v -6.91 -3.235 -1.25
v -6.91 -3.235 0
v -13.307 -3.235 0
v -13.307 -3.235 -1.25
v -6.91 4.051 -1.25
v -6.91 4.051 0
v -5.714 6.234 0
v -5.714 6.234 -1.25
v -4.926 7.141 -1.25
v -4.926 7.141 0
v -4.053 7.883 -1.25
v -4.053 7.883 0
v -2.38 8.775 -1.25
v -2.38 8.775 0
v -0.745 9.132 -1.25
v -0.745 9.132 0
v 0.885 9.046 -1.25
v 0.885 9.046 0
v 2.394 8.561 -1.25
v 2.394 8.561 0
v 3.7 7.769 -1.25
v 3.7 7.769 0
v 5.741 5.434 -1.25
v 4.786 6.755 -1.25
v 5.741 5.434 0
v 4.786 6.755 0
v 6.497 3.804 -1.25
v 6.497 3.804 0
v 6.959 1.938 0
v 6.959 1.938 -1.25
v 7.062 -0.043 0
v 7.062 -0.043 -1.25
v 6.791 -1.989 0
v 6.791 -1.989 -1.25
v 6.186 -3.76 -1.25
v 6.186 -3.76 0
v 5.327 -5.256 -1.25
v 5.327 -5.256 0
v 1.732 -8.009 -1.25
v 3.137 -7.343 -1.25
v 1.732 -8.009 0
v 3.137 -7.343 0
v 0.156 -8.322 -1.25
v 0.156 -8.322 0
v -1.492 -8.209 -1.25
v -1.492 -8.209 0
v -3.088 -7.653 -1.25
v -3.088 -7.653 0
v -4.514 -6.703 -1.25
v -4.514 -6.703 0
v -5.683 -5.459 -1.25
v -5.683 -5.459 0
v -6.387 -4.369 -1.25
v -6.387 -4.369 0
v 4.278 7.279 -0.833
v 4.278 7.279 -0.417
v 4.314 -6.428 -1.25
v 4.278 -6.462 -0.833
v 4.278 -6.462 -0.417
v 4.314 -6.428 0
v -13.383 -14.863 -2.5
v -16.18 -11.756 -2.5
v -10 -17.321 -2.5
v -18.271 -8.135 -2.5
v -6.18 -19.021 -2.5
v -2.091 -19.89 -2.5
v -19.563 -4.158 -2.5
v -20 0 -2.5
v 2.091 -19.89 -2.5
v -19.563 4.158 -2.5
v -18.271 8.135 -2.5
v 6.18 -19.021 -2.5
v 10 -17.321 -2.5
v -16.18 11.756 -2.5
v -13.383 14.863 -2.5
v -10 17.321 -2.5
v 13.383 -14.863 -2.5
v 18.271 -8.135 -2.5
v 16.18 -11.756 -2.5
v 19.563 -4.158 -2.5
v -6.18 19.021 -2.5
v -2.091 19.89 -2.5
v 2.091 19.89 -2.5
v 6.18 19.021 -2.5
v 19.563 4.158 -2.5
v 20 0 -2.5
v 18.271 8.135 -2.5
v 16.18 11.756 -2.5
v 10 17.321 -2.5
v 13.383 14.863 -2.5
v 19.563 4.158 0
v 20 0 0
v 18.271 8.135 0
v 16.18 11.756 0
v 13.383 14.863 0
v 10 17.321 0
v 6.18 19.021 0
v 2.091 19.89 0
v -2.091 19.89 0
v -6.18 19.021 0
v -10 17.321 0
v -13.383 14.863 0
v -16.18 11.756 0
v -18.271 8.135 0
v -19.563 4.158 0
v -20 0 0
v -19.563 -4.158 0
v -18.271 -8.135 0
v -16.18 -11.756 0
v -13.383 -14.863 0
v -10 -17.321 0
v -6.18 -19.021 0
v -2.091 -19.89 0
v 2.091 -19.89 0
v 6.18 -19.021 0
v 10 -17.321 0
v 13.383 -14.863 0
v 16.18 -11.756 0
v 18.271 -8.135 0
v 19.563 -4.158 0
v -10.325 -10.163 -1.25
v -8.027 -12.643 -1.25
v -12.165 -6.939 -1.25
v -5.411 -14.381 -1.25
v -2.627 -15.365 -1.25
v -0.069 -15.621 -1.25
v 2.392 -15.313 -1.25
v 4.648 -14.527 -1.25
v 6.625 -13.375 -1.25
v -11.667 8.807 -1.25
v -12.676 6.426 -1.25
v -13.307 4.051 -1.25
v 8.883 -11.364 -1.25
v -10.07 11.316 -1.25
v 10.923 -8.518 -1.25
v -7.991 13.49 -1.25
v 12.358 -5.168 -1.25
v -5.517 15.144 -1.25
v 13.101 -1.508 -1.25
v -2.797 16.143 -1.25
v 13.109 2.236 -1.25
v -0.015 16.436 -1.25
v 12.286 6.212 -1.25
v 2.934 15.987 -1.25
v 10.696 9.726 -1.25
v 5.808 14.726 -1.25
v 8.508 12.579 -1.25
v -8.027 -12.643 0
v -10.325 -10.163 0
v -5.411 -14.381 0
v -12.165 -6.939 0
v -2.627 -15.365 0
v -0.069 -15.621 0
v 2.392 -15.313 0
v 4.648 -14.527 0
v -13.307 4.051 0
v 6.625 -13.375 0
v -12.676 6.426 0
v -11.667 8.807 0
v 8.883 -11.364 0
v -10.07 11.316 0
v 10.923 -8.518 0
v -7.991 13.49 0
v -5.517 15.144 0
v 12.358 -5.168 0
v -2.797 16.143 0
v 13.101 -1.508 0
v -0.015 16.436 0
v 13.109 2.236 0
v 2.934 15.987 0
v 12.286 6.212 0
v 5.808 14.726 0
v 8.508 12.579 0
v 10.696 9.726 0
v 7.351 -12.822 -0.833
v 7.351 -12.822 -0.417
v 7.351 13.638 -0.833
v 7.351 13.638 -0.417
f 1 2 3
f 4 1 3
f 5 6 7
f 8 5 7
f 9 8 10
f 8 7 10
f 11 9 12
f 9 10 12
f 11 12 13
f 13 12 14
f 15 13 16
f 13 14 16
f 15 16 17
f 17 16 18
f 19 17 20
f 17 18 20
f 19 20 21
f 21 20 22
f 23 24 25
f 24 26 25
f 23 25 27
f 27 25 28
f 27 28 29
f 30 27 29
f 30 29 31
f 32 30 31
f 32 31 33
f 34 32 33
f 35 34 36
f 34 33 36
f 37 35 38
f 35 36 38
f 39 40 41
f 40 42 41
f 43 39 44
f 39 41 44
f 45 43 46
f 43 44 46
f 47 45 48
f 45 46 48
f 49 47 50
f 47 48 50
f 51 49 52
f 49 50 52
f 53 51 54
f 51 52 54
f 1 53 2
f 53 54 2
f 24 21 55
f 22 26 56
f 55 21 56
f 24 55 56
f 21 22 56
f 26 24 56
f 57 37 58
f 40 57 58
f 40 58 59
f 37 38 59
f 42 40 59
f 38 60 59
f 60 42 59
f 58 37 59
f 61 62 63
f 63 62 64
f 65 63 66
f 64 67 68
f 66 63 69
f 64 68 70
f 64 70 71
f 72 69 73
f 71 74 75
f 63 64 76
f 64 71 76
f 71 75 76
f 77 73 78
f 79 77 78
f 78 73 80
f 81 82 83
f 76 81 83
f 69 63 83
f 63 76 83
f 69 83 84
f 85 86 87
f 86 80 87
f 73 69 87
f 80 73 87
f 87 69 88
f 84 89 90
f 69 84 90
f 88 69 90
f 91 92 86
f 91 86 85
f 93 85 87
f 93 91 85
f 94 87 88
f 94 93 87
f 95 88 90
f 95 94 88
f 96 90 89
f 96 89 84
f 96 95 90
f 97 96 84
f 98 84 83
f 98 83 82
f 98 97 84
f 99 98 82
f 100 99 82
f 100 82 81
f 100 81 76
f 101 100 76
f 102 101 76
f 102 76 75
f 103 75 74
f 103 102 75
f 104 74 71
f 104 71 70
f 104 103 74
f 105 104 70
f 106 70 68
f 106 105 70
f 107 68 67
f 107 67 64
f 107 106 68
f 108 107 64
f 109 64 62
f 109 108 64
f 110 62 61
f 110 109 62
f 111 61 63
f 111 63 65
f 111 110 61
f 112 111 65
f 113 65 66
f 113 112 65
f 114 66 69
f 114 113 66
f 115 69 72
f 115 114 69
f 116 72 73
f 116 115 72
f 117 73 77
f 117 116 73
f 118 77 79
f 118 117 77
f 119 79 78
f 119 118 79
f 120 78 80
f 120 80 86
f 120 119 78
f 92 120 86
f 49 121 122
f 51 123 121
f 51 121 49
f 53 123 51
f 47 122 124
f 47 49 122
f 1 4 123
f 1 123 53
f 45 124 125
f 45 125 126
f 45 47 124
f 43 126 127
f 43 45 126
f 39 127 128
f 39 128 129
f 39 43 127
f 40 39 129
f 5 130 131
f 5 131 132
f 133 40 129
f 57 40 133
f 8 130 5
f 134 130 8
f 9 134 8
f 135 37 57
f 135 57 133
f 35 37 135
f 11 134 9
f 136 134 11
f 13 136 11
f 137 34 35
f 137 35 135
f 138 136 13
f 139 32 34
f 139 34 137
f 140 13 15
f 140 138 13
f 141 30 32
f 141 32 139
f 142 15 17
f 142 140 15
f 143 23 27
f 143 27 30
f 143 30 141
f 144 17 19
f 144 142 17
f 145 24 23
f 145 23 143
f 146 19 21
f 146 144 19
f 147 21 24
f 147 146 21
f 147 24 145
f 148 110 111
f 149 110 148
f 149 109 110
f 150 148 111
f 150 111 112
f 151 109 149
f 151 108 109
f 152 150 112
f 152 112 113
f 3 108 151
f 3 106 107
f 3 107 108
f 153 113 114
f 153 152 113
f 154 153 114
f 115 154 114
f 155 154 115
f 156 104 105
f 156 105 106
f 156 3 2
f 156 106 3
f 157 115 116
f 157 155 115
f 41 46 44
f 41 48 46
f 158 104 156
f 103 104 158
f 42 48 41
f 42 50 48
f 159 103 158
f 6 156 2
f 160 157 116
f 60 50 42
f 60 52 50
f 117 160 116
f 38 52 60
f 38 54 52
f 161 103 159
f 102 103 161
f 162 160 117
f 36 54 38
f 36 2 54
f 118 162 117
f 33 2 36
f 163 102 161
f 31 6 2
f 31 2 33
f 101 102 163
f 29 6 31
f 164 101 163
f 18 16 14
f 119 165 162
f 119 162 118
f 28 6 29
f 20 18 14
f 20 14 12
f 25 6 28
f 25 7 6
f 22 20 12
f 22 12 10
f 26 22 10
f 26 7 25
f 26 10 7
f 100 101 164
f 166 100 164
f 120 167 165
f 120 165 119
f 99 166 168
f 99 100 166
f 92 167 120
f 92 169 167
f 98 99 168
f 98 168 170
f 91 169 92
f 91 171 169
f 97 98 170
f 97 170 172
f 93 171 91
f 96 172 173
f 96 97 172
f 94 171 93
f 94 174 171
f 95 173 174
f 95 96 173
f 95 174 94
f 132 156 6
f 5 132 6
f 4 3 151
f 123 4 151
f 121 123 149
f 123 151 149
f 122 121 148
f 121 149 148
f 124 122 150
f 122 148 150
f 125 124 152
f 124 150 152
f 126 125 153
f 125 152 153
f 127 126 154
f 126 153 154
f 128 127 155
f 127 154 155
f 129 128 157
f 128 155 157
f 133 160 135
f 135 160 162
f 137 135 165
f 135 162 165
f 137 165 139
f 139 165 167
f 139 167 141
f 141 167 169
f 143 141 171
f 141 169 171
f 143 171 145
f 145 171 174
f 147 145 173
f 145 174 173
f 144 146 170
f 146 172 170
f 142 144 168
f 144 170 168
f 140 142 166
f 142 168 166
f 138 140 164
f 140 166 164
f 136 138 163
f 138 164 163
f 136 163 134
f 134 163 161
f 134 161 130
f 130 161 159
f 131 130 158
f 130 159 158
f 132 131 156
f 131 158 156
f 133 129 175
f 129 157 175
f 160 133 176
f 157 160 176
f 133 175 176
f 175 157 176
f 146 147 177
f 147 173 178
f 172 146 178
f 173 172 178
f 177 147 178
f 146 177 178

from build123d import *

# Parameters (mm, degrees)
SKETCH001_R  = 20
PAD_DEPTH    = 2.5
POCKET_DEPTH = 1.25


with BuildPart() as part:
    # Sketch001 (on DatumPlane) → Pad (new body)
    with BuildSketch(Plane.XY):
        Circle(SKETCH001_R)
    extrude(amount=-PAD_DEPTH)

    # Sketch002 (on DatumPlane) → Pocket (cut)
    with BuildSketch(Plane.XY):
        with BuildLine():
            add(Edge.make_bspline(
                [(-13.306781, 4.051388), (-6.910381, 4.051388)],
                knots=[0, 0, 131, 131], degree=1))
            add(Edge.make_bspline(
                [(-6.910381, 4.051388), (-3.033469, 14.149212), (4.277794, 7.278702), (11.589056, 0.408192), (4.277794, -6.462319), (-3.033469, -13.332829), (-6.910381, -3.235005)],
                knots=[3.571368, 3.571368, 3.571368, 5.379246, 5.379246, 7.187124, 7.187124, 8.995003, 8.995003, 8.995003], degree=2, weights=[1, 0.61852, 1, 0.61852, 1, 0.61852, 1]))
            add(Edge.make_bspline(
                [(-6.910381, -3.235005), (-13.306781, -3.235005)],
                knots=[0, 0, 131, 131], degree=1))
            add(Edge.make_bspline(
                [(-13.306781, -3.235005), (-8.84633, -26.051739), (7.35143, -12.821774), (23.549189, 0.408192), (7.35143, 13.638157), (-8.84633, 26.868122), (-13.306781, 4.051388)],
                knots=[3.370869, 3.370869, 3.370869, 5.312413, 5.312413, 7.253957, 7.253957, 9.195502, 9.195502, 9.195502], degree=2, weights=[1, 0.564662, 1, 0.564662, 1, 0.564662, 1]))
        make_face()
    extrude(amount=-POCKET_DEPTH, mode=Mode.SUBTRACT)


solid = part.part
